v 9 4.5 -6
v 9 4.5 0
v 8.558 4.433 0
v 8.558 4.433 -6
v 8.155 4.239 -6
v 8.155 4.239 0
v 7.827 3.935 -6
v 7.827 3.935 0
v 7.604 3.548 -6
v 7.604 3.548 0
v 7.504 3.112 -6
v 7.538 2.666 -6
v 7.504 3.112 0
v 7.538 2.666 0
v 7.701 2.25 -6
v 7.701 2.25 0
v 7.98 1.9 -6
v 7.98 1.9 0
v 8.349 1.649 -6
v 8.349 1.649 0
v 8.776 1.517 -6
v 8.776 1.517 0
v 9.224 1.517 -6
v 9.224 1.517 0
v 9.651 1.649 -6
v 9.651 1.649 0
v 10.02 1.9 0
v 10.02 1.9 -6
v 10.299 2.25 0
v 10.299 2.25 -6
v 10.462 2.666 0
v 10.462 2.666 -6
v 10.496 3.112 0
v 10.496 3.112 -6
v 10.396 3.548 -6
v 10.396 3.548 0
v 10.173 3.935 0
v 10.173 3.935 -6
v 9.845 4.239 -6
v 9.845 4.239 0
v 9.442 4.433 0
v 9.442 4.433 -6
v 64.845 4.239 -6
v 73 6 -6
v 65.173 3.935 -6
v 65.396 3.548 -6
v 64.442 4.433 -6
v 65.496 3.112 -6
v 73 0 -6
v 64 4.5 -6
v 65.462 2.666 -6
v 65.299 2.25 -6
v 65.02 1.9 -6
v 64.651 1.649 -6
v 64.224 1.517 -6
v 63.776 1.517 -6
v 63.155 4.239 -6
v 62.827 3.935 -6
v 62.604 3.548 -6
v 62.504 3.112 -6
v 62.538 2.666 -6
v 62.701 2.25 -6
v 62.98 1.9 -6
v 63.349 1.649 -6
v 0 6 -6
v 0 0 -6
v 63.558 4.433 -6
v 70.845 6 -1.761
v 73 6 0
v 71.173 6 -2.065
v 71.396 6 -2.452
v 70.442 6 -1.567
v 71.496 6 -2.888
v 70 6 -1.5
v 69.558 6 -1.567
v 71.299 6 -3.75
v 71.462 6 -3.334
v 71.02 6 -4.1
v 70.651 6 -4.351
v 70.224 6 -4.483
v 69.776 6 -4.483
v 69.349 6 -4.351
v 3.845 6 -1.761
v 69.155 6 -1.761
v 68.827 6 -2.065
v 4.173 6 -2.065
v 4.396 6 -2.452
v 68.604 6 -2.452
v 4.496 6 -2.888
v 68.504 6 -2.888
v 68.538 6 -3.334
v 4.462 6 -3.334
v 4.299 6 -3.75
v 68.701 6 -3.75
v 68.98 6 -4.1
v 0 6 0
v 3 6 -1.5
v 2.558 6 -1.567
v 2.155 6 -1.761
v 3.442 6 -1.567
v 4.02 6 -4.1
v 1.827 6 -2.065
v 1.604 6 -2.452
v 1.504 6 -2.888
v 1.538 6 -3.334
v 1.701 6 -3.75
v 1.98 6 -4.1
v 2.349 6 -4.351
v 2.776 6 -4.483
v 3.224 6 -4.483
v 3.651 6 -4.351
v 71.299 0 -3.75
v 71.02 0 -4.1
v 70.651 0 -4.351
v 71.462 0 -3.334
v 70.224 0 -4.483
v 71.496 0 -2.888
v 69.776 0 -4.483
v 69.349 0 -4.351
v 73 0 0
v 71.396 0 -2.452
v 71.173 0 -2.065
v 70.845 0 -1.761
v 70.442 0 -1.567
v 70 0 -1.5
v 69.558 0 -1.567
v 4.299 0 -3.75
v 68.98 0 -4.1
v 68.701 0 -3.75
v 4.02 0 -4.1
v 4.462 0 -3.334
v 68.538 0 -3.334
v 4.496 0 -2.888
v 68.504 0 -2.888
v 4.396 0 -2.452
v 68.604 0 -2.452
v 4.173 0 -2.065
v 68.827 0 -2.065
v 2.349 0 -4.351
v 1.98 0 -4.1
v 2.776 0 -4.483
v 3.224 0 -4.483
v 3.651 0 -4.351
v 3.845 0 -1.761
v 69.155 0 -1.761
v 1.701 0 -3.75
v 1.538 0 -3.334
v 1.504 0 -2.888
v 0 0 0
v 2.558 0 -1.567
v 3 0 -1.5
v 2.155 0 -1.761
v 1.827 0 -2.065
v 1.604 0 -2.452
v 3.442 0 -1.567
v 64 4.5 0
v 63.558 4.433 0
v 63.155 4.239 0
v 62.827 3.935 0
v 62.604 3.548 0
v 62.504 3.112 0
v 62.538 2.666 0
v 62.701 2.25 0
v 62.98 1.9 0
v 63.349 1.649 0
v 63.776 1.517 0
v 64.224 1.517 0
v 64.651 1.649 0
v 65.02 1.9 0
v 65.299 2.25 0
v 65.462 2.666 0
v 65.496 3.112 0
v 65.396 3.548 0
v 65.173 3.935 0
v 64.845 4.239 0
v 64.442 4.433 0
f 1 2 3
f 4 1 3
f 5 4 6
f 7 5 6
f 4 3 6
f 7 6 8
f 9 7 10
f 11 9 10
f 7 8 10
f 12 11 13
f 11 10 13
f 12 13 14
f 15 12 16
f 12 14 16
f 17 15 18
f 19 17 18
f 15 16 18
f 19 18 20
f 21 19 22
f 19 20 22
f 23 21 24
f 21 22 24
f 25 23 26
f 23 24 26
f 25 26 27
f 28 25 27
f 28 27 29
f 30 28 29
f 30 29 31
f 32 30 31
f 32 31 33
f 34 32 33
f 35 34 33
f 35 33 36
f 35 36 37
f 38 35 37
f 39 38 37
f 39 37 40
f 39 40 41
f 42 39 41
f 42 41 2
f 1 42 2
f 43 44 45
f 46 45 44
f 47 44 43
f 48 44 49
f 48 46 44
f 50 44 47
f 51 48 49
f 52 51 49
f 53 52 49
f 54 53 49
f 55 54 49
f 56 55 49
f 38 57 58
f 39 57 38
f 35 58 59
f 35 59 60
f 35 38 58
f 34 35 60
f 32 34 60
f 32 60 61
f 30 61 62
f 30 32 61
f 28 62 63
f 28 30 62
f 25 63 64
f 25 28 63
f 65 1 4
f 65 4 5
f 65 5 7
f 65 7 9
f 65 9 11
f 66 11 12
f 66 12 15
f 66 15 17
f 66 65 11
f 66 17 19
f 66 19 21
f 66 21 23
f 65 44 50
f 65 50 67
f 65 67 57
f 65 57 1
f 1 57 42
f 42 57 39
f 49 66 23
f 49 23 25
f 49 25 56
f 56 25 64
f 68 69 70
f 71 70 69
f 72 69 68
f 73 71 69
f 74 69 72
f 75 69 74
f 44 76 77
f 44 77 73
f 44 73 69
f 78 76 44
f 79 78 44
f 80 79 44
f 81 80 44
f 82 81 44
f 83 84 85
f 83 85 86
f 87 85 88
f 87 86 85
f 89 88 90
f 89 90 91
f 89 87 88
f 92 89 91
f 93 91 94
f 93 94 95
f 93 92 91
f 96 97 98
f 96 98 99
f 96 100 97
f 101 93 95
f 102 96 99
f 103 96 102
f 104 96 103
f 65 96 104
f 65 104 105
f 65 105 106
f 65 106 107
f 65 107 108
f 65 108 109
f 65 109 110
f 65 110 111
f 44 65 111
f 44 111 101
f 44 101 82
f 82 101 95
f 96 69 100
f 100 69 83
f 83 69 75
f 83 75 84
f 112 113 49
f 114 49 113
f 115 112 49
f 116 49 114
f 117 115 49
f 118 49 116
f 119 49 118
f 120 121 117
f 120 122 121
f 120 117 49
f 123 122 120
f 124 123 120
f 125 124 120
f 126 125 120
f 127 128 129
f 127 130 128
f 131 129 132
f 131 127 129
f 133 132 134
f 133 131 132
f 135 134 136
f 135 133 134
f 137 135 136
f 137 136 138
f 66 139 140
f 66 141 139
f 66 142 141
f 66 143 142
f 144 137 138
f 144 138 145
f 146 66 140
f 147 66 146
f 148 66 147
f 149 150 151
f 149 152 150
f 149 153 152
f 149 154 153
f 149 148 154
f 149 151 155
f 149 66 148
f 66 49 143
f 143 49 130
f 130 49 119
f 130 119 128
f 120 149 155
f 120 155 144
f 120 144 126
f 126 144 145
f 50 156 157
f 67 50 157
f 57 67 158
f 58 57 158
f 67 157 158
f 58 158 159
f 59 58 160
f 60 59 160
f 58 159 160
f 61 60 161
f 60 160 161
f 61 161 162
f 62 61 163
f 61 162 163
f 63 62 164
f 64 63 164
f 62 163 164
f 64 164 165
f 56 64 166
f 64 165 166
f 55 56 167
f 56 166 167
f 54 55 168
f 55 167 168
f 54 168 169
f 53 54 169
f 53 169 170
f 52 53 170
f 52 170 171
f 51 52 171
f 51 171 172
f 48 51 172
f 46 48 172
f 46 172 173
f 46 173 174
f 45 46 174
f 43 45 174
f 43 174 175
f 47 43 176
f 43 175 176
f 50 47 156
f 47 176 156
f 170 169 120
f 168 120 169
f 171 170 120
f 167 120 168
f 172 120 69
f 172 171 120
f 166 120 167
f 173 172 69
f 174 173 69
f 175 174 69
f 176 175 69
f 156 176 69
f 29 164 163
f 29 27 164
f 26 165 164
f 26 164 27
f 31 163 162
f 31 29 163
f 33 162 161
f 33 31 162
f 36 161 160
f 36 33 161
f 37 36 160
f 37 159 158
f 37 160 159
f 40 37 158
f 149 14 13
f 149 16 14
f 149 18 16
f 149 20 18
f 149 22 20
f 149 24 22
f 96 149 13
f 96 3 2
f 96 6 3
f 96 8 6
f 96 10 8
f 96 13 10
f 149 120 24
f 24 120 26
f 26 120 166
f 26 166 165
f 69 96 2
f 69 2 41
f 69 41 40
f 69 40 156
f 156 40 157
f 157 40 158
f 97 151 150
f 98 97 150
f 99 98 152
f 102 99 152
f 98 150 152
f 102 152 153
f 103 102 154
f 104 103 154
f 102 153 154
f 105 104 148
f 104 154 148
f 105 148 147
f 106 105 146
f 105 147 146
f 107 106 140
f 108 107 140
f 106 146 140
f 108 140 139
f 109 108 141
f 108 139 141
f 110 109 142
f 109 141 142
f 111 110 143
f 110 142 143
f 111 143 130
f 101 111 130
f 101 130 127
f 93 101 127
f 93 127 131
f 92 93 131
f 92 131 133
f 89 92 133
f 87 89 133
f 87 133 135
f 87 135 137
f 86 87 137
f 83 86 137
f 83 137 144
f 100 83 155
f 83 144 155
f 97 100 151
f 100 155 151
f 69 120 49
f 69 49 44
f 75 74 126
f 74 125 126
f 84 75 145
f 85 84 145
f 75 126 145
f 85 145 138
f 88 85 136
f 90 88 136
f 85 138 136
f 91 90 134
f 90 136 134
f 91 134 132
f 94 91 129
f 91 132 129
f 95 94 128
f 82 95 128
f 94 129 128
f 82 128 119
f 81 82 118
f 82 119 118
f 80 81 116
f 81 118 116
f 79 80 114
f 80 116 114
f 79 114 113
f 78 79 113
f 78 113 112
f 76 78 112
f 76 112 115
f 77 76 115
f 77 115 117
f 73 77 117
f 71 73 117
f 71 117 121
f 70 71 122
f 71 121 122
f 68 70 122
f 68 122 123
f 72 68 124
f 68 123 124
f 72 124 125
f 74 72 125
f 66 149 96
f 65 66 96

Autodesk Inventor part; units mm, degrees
ref_plane "YZ Plane" through (0, 0, 0) normal (1, 0, 0) x (0, 1, 0)
ref_plane "XZ Plane" through (0, 0, 0) normal (0, 1, 0) x (-1, 0, 0)
ref_plane "XY Plane" through (0, 0, 0) normal (0, 0, 1) x (1, 0, 0)
sketch "Sketch1" plane through (0, 0, 0) normal (1, 0, 0) x (0, 1, 0)
  line L0 (0, 0) -> (6, 0)
  line L1 (6, 0) -> (6, -6)
  line L2 (6, -6) -> (0, -6)
  line L3 (0, -6) -> (0, 0)
  dimension "d0" = 6
  dimension "d1" = 6
extrude "Extrusion1" add sketch "Sketch1" along normal blind 73
sketch "Sketch2" plane through (0, 6, 0) normal (0, 1, 0) x (1, 0, 0)
  line L0 (0, 6) -> (73, 6) construction
  line L1 (36.5, 6) -> (36.5, 0)
  line L2 (0, 0) -> (73, 0) construction
  line L3 (0, 6) -> (0, 0) construction
  line L4 (0, 3) -> (73, 3)
  line L5 (73, 0) -> (73, 6) construction
  point P0 (3, 3)
  point P1 (70, 3)
  dimension "d8" = 3
hole "Hole1" at (3, 6, -3) at (70, 6, -3) direction (0, -1, 0) diameter 3 end through all
sketch "Sketch3" plane through (0, 0, -6) normal (0, 0, -1) x (-1, 0, 0)
  line L0 (0, 6) -> (0, 0) construction
  line L1 (0, 6) -> (-73, 6) construction
  line L2 (-73, 0) -> (-73, 6) construction
  line L3 (0, 0) -> (-73, 0) construction
  line L4 (0, 3) -> (-73, 3) construction
  line L5 (0, 6) -> (-73, 6) construction
  line L6 (-36.5, 6) -> (-36.5, 0) construction
  line L7 (0, 0) -> (-73, 0) construction
  point P0 (-9, 3)
  point P1 (-64, 3)
  dimension "d16" = 9
hole "Hole2" at (9, 3, -6) at (64, 3, -6) direction (0, 0, 1) diameter 3 end through all
equation "\"d1\" = d0"
properties part number "transverse" material "Aluminum"
